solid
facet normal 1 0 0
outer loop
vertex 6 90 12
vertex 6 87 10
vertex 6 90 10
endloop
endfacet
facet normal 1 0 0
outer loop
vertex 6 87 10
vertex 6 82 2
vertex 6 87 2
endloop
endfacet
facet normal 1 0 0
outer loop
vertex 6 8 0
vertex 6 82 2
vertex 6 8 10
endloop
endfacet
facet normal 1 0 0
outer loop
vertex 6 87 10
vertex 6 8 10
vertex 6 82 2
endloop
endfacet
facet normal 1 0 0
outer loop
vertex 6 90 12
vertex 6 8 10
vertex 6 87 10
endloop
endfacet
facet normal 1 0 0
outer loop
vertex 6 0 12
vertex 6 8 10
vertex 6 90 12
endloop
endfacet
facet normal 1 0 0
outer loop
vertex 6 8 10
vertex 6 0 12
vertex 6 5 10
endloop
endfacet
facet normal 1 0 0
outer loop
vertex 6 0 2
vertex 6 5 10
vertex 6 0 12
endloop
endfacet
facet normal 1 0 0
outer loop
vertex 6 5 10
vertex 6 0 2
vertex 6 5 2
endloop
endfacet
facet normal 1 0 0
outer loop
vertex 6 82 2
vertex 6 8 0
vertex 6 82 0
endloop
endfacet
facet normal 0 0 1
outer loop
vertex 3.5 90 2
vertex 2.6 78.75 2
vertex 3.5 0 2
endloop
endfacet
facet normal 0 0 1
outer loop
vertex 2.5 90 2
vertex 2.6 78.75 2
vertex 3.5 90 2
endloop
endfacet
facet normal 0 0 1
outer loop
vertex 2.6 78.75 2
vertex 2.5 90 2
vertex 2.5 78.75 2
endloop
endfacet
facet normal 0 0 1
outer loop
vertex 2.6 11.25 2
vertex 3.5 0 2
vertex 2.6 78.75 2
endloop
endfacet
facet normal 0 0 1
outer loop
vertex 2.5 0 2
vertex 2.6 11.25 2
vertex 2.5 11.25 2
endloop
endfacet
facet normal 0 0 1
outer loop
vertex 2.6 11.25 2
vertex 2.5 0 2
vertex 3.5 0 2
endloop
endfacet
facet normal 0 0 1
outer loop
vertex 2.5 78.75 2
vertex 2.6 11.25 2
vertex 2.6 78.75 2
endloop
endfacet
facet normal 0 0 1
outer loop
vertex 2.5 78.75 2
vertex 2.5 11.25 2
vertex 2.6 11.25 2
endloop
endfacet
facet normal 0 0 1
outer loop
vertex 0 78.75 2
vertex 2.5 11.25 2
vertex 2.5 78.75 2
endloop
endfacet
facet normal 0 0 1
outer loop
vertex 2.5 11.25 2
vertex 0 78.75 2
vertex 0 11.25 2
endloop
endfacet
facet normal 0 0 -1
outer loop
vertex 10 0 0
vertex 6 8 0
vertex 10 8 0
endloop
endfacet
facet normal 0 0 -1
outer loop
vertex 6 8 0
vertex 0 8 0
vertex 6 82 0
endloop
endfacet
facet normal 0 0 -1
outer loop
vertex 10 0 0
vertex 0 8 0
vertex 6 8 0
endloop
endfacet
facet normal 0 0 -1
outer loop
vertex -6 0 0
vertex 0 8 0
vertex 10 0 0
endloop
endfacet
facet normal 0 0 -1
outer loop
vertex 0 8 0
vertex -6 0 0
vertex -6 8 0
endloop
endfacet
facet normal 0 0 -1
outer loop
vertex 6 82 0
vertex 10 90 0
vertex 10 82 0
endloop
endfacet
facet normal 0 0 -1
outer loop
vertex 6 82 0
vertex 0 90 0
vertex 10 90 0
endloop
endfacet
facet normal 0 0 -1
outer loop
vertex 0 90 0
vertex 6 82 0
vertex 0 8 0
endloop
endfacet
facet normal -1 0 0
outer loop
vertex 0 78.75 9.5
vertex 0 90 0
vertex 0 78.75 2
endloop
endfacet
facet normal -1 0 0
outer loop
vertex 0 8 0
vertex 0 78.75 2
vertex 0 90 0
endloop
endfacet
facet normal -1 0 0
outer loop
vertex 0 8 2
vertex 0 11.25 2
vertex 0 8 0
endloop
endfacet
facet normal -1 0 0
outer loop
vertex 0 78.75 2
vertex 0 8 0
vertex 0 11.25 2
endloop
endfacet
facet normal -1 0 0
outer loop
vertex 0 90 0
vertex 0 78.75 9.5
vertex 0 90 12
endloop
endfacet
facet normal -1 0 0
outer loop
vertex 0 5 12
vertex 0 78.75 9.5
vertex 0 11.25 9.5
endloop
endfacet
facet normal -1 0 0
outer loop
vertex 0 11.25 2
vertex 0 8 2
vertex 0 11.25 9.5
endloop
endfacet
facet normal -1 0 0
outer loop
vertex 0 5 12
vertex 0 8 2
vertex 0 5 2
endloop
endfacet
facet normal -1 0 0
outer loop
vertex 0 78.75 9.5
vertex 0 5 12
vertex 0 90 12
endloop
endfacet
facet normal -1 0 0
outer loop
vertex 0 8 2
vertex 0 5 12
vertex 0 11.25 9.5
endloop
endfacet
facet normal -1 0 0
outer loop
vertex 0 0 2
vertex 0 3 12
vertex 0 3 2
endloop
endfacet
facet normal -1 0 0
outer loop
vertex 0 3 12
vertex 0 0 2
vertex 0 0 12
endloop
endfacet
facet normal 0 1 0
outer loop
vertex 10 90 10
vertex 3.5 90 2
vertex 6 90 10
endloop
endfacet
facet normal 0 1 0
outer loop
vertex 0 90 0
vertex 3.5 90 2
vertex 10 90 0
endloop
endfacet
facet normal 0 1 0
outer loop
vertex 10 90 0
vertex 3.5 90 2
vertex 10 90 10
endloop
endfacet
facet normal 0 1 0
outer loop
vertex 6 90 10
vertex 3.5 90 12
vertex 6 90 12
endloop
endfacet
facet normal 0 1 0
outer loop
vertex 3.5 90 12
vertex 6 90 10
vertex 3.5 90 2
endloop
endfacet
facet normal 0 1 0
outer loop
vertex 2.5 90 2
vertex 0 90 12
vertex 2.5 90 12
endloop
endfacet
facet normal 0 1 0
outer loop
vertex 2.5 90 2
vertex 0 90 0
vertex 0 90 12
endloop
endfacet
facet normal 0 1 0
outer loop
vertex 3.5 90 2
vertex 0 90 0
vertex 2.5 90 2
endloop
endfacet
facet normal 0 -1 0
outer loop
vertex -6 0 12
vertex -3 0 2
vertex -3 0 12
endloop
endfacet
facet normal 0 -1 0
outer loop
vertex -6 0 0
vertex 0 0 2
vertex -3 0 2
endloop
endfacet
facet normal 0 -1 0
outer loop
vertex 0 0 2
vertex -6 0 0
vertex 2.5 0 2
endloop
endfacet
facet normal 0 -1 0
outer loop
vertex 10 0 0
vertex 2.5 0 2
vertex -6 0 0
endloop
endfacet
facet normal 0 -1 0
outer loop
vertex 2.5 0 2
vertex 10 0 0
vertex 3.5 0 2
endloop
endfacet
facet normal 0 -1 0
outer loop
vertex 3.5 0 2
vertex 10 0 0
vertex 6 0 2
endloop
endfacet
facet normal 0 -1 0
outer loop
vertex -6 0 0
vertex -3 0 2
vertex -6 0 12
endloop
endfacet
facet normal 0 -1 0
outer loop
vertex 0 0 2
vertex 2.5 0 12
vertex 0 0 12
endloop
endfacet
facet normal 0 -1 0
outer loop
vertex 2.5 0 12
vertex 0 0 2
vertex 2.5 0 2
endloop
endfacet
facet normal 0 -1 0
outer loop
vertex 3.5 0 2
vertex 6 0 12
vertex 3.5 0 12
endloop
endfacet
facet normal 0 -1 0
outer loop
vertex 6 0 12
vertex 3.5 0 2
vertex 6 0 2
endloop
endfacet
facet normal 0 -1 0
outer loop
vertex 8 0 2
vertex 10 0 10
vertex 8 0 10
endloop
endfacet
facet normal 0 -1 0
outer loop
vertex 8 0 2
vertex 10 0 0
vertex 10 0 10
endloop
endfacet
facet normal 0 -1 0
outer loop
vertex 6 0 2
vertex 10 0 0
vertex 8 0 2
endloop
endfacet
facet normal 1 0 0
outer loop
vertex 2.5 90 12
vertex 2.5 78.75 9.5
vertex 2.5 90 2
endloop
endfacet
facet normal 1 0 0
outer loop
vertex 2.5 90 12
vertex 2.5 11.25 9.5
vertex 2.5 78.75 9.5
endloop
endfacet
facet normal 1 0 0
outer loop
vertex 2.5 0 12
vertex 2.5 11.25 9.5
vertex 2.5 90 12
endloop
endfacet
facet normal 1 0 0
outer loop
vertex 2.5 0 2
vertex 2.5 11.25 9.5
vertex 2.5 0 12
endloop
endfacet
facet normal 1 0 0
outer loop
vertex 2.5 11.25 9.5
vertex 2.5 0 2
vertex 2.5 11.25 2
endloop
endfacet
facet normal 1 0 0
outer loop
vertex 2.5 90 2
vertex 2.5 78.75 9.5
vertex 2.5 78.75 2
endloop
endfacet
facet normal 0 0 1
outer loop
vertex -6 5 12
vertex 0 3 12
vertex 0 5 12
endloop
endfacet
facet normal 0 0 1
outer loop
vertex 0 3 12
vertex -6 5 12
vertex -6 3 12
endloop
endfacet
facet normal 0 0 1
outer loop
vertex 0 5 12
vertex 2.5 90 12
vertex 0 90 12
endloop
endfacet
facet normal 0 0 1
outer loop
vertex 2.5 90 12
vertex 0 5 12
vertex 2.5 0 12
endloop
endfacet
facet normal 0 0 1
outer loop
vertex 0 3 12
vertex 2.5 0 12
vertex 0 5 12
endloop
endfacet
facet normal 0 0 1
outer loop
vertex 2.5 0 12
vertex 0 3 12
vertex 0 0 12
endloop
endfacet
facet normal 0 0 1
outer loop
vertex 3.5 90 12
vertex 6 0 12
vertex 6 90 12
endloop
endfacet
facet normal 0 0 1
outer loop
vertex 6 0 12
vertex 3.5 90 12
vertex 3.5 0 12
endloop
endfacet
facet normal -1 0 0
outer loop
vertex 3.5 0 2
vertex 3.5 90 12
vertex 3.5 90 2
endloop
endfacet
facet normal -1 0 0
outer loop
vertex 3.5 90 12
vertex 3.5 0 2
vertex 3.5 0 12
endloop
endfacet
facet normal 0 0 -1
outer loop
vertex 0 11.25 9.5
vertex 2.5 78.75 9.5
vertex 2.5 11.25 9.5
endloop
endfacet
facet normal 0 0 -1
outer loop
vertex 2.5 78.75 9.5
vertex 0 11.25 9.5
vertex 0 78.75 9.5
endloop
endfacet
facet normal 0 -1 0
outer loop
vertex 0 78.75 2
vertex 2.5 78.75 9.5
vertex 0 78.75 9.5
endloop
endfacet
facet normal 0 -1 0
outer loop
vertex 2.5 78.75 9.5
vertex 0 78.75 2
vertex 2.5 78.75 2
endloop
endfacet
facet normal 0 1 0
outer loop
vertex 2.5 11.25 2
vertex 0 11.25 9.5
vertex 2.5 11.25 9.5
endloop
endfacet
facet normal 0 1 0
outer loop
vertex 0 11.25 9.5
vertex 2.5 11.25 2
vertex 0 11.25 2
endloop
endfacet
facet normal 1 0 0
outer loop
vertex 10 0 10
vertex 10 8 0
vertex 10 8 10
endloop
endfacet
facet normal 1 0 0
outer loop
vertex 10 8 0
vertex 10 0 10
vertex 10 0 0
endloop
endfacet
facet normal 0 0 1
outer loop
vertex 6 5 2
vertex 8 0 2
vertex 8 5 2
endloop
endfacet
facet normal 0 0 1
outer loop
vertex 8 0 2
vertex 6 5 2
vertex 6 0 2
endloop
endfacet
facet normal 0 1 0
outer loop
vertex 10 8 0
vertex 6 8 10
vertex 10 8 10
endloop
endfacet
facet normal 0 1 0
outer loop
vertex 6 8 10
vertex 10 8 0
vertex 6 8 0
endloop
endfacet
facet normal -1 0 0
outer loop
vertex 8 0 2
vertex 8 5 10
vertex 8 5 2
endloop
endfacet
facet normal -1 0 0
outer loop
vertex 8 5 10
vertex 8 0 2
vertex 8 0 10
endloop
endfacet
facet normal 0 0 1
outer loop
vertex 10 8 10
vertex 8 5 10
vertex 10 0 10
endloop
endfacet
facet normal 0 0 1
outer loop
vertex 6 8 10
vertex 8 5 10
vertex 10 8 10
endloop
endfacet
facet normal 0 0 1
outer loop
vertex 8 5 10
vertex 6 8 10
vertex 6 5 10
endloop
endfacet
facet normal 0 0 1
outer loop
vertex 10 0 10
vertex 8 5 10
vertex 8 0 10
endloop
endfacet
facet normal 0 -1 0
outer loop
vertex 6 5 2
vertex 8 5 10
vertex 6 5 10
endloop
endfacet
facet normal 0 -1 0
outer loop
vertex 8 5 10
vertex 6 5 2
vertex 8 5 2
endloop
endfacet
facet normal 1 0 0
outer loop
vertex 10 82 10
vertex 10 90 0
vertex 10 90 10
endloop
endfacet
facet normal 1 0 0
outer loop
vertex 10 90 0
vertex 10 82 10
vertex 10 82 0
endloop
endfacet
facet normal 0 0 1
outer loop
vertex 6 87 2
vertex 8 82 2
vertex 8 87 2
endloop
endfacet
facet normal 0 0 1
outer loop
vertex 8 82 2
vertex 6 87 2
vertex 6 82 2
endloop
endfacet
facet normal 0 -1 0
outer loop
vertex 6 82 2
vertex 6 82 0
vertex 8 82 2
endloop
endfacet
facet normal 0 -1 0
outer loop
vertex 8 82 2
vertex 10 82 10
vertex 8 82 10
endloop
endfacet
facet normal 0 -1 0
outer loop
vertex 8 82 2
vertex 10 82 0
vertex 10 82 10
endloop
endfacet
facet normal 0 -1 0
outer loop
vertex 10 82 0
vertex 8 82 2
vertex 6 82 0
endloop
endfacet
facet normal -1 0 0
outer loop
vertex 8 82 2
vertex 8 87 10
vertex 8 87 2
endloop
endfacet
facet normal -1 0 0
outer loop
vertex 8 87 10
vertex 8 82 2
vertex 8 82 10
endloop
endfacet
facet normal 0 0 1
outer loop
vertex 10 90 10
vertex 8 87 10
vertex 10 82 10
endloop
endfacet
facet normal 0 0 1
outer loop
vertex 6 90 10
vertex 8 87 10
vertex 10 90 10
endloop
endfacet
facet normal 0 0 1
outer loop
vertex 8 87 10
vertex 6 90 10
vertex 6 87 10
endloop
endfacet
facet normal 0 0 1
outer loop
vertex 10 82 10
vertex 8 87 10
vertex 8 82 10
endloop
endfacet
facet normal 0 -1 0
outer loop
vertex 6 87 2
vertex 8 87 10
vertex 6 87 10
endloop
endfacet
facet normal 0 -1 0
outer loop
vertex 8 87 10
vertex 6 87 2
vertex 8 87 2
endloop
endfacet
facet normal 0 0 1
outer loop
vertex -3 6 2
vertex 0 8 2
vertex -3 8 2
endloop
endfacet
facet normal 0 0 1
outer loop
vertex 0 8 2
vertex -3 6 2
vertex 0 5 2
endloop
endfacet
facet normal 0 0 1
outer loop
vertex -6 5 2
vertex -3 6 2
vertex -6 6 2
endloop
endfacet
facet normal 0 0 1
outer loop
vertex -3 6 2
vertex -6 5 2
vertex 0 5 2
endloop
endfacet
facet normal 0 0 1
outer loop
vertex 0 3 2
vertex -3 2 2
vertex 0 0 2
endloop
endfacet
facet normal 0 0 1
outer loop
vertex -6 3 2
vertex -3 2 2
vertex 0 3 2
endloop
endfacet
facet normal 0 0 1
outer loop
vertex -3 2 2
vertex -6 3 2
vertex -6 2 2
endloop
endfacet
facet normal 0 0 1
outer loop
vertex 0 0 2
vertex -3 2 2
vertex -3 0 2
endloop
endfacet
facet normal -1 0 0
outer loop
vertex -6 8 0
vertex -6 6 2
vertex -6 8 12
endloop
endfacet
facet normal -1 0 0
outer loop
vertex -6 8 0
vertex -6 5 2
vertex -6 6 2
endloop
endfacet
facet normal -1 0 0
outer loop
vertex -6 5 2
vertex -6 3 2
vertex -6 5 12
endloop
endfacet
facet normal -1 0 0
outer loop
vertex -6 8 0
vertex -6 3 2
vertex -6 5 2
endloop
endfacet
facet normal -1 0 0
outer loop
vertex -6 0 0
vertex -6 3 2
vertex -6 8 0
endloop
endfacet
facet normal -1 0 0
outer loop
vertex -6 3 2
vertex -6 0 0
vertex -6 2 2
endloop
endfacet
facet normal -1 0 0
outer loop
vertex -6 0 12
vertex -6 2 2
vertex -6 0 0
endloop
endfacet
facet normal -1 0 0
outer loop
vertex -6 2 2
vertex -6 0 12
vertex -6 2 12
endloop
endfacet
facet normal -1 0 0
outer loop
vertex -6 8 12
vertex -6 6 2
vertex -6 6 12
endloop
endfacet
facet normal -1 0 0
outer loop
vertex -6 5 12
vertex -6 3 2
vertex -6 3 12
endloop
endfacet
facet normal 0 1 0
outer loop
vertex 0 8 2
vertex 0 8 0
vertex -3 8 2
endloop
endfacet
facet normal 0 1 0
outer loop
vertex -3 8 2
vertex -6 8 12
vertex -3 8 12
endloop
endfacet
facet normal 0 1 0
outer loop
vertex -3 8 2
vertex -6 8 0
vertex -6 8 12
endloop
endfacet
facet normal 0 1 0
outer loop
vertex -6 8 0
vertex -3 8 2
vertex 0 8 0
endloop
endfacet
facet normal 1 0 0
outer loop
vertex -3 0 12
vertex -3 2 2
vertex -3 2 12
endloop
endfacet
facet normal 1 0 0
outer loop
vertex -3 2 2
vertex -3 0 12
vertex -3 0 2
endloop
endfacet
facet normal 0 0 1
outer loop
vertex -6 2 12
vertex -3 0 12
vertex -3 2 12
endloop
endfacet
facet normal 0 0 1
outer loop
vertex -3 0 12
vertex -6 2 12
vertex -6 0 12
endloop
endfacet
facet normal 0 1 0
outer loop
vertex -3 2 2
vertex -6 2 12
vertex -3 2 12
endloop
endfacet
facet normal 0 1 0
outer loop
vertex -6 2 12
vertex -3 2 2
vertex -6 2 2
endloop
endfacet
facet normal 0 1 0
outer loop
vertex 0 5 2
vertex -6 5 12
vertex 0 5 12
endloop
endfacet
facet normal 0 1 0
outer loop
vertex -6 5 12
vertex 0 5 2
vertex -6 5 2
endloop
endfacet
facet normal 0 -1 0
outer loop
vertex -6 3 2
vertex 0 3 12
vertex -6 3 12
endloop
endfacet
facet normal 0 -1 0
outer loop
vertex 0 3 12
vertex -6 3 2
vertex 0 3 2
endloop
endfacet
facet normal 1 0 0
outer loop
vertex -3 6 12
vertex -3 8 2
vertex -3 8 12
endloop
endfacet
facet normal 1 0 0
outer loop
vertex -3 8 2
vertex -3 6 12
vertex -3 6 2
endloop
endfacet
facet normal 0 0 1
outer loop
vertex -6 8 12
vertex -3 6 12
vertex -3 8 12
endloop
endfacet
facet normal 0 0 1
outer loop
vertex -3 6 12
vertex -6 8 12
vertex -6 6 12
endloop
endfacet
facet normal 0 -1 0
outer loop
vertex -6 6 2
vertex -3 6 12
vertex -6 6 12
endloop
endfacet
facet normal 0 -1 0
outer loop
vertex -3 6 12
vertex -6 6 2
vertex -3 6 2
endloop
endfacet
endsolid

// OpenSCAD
strip_length_mm = 90;
base_height_mm = 2;
base_width_mm = 3;

tape_height_mm = 10;
tape_width_mm = 1;

track_window_width_mm = 2.5;
track_base_width_mm = 2.5;
track_height_mm = base_height_mm + tape_height_mm;

track_width_mm = track_window_width_mm + tape_width_mm + track_base_width_mm;

window_length_mm = strip_length_mm * 0.75; 
window_height_mm = 7.5; 


module track_tape() {
    difference(){
        union() {
            // base
            cube([track_width_mm,strip_length_mm,base_height_mm]);
            
            // tape track (window)
            translate([0,0,0])
                cube([track_window_width_mm,strip_length_mm,track_height_mm]);
            translate([track_window_width_mm + tape_width_mm,0,0])
                cube([track_base_width_mm,strip_length_mm,track_height_mm]);
        }

        // Windwow
        translate([-0.1, (strip_length_mm - window_length_mm) / 2,base_height_mm])
            cube([track_window_width_mm + 0.2,window_length_mm,window_height_mm]);
    }
}

module track_foot() {
    standoff_width_mm = 2;
    standoff_length_mm = 3;
    key_width_mm = 2;
    key_length_mm = 8;
    total_width_mm = standoff_width_mm + key_width_mm;
    total_length_mm = key_length_mm;
    
    foot_height_mm = base_height_mm + 8;
    
    union(){
        // base
        translate([0,standoff_length_mm - key_length_mm,0])
            cube([total_width_mm,total_length_mm,base_height_mm]);
        // standoff
        cube([standoff_width_mm,standoff_length_mm,foot_height_mm]);
        // key
        translate([standoff_width_mm,standoff_length_mm - key_length_mm,0])
            cube([key_width_mm,key_length_mm,foot_height_mm]);
    }
    
}

module track_cover_catch() {
    peg_width_mm = 3;
    peg_length_mm = 2;
    peg_gap_length_mm = 1;
    peg_pluse_gap_mm = peg_length_mm + peg_gap_length_mm;
    pegs = 3;

    total_width_mm = peg_width_mm + 3;
    total_length_mm = pegs * peg_length_mm + (pegs - 1) * peg_gap_length_mm;
    
    translate([-total_width_mm,0,0])
        union(){
            // base
            translate([0,0,0])
                cube([total_width_mm,total_length_mm,base_height_mm]);
            // peg(s)
            translate([0,0 * peg_pluse_gap_mm,0])
                cube([peg_width_mm,peg_length_mm,track_height_mm]);
            translate([0,1 * peg_pluse_gap_mm,0])
                cube([total_width_mm,peg_length_mm,track_height_mm]);
            translate([0,2 * peg_pluse_gap_mm,0])
                cube([peg_width_mm,peg_length_mm,track_height_mm]);
        }
    
}

union() {
    track_tape();
    translate([track_width_mm,5,0])
        track_foot();
    translate([track_width_mm,strip_length_mm -3,0])
        track_foot();

    translate([0,0,0])
        track_cover_catch();
}
